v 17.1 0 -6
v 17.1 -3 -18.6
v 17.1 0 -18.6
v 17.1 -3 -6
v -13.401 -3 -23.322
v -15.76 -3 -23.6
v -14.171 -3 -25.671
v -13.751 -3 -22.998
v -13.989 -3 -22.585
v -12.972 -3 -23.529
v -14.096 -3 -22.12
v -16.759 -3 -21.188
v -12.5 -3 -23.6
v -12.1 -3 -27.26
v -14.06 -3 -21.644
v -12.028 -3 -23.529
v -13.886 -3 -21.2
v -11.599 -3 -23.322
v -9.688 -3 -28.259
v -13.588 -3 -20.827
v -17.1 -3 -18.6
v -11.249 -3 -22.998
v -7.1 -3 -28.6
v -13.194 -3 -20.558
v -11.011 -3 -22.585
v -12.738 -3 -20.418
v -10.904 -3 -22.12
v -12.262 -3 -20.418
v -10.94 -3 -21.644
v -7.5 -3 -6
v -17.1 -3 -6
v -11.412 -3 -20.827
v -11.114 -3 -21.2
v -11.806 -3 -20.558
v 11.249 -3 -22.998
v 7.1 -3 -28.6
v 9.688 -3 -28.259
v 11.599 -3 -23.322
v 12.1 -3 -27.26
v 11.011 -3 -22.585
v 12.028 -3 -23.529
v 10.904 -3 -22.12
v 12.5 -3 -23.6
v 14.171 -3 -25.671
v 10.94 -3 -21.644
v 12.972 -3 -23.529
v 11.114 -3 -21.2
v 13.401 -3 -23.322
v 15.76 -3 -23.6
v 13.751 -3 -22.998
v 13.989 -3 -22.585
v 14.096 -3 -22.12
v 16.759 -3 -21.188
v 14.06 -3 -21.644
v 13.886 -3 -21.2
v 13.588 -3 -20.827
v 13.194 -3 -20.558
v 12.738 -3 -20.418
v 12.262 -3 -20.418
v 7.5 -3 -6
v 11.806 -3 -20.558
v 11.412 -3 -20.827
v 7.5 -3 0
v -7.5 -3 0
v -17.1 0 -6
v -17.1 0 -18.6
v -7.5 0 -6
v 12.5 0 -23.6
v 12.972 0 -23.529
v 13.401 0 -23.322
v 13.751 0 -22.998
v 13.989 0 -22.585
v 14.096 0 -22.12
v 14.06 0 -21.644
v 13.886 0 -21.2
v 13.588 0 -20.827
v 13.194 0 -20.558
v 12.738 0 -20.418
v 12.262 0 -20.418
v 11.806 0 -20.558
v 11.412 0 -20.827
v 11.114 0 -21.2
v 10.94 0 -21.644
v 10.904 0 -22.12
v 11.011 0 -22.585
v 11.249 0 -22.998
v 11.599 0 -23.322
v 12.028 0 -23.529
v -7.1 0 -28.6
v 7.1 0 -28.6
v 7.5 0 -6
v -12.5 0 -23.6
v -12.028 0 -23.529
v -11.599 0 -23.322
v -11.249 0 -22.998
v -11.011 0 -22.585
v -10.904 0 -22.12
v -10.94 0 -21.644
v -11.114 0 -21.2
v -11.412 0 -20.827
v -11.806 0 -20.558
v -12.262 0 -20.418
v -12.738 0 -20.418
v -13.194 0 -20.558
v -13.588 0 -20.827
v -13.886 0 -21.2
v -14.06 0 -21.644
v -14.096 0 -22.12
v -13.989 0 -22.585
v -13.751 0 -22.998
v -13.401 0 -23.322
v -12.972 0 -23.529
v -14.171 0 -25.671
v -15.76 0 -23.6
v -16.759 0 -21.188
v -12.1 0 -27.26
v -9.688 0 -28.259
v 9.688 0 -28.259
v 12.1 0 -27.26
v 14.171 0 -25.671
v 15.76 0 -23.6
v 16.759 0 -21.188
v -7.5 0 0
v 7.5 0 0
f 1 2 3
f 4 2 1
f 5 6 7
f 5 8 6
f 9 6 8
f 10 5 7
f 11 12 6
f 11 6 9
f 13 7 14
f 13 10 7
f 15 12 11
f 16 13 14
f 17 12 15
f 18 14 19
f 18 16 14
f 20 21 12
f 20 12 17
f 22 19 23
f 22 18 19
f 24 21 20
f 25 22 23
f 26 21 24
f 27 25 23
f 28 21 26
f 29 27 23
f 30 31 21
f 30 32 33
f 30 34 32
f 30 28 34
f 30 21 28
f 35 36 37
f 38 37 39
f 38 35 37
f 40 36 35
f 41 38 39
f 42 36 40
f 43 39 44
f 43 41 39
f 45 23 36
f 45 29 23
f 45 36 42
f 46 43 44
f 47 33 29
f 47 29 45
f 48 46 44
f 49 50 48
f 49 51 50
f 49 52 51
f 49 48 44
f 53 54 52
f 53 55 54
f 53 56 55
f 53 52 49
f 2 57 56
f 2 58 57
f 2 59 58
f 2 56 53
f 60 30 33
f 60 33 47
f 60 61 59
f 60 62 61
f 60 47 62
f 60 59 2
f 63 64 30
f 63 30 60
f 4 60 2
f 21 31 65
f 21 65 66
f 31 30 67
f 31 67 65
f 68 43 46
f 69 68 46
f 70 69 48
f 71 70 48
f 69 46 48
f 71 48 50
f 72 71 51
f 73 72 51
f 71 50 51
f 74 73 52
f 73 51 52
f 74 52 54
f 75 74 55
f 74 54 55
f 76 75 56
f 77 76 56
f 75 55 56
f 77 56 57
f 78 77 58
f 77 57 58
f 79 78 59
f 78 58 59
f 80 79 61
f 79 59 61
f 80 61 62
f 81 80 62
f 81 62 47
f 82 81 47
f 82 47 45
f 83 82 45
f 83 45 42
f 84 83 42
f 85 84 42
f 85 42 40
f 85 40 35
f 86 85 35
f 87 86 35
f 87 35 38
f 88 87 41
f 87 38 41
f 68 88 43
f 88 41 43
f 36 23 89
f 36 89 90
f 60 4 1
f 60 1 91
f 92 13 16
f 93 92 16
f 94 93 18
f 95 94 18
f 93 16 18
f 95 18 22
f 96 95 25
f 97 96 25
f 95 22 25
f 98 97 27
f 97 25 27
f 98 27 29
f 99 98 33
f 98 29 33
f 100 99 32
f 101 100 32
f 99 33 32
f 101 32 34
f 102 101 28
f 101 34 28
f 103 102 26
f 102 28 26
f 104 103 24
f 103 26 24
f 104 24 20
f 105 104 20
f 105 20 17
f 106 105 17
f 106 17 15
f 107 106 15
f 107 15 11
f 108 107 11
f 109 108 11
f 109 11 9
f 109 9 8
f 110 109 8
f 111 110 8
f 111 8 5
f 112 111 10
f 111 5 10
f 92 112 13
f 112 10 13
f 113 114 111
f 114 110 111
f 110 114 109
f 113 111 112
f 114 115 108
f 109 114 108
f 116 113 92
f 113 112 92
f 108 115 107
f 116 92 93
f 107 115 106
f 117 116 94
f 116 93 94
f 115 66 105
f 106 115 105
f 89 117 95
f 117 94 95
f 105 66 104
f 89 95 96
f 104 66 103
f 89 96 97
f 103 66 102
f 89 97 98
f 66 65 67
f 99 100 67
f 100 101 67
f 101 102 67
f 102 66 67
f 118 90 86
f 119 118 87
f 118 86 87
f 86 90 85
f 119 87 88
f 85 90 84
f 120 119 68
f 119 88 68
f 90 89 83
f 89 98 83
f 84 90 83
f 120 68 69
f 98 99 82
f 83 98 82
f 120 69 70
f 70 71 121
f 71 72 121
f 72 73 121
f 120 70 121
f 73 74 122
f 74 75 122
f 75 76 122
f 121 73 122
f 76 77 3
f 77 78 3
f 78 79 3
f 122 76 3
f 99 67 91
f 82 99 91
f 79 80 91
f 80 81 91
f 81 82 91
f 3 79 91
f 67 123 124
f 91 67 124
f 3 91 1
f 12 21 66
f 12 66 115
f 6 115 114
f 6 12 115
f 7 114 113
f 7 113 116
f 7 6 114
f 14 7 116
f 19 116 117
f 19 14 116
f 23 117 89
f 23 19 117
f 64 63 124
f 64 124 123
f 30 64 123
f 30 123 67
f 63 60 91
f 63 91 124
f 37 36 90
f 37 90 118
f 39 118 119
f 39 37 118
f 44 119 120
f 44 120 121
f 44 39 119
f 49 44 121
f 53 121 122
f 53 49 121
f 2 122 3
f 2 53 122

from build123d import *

# Parameters (mm, degrees)
ESBO_O1_R                = 1.6
RESSALTO_EXTRUS_O1_DEPTH = 3


with BuildPart() as part:
    # Esboço1 → Ressalto-extrusão1 (new body)
    with BuildSketch(Plane.XZ.offset(3)):
        with BuildLine():
            Line((-7.1, -28.6), (7.1, -28.6))
            ThreePointArc((7.1, -28.6), (14.171067812, -25.671067812), (17.1, -18.6))
            Line((17.1, -18.6), (17.1, -6))
            Line((17.1, -6), (7.5, -6))
            Line((7.5, -6), (7.5, 0))
            Line((7.5, 0), (-7.5, 0))
            Line((-7.5, 0), (-7.5, -6))
            Line((-7.5, -6), (-17.1, -6))
            Line((-17.1, -6), (-17.1, -18.6))
            ThreePointArc((-17.1, -18.6), (-14.171067812, -25.671067812), (-7.1, -28.6))
        make_face()
        with Locations(Location((-12.5, -22, 0), (0, 0, 270))):
            Circle(ESBO_O1_R, mode=Mode.SUBTRACT)
        with Locations(Location((12.5, -22, 0), (0, 0, 270))):
            Circle(ESBO_O1_R, mode=Mode.SUBTRACT)
    extrude(amount=-RESSALTO_EXTRUS_O1_DEPTH)


solid = part.part
